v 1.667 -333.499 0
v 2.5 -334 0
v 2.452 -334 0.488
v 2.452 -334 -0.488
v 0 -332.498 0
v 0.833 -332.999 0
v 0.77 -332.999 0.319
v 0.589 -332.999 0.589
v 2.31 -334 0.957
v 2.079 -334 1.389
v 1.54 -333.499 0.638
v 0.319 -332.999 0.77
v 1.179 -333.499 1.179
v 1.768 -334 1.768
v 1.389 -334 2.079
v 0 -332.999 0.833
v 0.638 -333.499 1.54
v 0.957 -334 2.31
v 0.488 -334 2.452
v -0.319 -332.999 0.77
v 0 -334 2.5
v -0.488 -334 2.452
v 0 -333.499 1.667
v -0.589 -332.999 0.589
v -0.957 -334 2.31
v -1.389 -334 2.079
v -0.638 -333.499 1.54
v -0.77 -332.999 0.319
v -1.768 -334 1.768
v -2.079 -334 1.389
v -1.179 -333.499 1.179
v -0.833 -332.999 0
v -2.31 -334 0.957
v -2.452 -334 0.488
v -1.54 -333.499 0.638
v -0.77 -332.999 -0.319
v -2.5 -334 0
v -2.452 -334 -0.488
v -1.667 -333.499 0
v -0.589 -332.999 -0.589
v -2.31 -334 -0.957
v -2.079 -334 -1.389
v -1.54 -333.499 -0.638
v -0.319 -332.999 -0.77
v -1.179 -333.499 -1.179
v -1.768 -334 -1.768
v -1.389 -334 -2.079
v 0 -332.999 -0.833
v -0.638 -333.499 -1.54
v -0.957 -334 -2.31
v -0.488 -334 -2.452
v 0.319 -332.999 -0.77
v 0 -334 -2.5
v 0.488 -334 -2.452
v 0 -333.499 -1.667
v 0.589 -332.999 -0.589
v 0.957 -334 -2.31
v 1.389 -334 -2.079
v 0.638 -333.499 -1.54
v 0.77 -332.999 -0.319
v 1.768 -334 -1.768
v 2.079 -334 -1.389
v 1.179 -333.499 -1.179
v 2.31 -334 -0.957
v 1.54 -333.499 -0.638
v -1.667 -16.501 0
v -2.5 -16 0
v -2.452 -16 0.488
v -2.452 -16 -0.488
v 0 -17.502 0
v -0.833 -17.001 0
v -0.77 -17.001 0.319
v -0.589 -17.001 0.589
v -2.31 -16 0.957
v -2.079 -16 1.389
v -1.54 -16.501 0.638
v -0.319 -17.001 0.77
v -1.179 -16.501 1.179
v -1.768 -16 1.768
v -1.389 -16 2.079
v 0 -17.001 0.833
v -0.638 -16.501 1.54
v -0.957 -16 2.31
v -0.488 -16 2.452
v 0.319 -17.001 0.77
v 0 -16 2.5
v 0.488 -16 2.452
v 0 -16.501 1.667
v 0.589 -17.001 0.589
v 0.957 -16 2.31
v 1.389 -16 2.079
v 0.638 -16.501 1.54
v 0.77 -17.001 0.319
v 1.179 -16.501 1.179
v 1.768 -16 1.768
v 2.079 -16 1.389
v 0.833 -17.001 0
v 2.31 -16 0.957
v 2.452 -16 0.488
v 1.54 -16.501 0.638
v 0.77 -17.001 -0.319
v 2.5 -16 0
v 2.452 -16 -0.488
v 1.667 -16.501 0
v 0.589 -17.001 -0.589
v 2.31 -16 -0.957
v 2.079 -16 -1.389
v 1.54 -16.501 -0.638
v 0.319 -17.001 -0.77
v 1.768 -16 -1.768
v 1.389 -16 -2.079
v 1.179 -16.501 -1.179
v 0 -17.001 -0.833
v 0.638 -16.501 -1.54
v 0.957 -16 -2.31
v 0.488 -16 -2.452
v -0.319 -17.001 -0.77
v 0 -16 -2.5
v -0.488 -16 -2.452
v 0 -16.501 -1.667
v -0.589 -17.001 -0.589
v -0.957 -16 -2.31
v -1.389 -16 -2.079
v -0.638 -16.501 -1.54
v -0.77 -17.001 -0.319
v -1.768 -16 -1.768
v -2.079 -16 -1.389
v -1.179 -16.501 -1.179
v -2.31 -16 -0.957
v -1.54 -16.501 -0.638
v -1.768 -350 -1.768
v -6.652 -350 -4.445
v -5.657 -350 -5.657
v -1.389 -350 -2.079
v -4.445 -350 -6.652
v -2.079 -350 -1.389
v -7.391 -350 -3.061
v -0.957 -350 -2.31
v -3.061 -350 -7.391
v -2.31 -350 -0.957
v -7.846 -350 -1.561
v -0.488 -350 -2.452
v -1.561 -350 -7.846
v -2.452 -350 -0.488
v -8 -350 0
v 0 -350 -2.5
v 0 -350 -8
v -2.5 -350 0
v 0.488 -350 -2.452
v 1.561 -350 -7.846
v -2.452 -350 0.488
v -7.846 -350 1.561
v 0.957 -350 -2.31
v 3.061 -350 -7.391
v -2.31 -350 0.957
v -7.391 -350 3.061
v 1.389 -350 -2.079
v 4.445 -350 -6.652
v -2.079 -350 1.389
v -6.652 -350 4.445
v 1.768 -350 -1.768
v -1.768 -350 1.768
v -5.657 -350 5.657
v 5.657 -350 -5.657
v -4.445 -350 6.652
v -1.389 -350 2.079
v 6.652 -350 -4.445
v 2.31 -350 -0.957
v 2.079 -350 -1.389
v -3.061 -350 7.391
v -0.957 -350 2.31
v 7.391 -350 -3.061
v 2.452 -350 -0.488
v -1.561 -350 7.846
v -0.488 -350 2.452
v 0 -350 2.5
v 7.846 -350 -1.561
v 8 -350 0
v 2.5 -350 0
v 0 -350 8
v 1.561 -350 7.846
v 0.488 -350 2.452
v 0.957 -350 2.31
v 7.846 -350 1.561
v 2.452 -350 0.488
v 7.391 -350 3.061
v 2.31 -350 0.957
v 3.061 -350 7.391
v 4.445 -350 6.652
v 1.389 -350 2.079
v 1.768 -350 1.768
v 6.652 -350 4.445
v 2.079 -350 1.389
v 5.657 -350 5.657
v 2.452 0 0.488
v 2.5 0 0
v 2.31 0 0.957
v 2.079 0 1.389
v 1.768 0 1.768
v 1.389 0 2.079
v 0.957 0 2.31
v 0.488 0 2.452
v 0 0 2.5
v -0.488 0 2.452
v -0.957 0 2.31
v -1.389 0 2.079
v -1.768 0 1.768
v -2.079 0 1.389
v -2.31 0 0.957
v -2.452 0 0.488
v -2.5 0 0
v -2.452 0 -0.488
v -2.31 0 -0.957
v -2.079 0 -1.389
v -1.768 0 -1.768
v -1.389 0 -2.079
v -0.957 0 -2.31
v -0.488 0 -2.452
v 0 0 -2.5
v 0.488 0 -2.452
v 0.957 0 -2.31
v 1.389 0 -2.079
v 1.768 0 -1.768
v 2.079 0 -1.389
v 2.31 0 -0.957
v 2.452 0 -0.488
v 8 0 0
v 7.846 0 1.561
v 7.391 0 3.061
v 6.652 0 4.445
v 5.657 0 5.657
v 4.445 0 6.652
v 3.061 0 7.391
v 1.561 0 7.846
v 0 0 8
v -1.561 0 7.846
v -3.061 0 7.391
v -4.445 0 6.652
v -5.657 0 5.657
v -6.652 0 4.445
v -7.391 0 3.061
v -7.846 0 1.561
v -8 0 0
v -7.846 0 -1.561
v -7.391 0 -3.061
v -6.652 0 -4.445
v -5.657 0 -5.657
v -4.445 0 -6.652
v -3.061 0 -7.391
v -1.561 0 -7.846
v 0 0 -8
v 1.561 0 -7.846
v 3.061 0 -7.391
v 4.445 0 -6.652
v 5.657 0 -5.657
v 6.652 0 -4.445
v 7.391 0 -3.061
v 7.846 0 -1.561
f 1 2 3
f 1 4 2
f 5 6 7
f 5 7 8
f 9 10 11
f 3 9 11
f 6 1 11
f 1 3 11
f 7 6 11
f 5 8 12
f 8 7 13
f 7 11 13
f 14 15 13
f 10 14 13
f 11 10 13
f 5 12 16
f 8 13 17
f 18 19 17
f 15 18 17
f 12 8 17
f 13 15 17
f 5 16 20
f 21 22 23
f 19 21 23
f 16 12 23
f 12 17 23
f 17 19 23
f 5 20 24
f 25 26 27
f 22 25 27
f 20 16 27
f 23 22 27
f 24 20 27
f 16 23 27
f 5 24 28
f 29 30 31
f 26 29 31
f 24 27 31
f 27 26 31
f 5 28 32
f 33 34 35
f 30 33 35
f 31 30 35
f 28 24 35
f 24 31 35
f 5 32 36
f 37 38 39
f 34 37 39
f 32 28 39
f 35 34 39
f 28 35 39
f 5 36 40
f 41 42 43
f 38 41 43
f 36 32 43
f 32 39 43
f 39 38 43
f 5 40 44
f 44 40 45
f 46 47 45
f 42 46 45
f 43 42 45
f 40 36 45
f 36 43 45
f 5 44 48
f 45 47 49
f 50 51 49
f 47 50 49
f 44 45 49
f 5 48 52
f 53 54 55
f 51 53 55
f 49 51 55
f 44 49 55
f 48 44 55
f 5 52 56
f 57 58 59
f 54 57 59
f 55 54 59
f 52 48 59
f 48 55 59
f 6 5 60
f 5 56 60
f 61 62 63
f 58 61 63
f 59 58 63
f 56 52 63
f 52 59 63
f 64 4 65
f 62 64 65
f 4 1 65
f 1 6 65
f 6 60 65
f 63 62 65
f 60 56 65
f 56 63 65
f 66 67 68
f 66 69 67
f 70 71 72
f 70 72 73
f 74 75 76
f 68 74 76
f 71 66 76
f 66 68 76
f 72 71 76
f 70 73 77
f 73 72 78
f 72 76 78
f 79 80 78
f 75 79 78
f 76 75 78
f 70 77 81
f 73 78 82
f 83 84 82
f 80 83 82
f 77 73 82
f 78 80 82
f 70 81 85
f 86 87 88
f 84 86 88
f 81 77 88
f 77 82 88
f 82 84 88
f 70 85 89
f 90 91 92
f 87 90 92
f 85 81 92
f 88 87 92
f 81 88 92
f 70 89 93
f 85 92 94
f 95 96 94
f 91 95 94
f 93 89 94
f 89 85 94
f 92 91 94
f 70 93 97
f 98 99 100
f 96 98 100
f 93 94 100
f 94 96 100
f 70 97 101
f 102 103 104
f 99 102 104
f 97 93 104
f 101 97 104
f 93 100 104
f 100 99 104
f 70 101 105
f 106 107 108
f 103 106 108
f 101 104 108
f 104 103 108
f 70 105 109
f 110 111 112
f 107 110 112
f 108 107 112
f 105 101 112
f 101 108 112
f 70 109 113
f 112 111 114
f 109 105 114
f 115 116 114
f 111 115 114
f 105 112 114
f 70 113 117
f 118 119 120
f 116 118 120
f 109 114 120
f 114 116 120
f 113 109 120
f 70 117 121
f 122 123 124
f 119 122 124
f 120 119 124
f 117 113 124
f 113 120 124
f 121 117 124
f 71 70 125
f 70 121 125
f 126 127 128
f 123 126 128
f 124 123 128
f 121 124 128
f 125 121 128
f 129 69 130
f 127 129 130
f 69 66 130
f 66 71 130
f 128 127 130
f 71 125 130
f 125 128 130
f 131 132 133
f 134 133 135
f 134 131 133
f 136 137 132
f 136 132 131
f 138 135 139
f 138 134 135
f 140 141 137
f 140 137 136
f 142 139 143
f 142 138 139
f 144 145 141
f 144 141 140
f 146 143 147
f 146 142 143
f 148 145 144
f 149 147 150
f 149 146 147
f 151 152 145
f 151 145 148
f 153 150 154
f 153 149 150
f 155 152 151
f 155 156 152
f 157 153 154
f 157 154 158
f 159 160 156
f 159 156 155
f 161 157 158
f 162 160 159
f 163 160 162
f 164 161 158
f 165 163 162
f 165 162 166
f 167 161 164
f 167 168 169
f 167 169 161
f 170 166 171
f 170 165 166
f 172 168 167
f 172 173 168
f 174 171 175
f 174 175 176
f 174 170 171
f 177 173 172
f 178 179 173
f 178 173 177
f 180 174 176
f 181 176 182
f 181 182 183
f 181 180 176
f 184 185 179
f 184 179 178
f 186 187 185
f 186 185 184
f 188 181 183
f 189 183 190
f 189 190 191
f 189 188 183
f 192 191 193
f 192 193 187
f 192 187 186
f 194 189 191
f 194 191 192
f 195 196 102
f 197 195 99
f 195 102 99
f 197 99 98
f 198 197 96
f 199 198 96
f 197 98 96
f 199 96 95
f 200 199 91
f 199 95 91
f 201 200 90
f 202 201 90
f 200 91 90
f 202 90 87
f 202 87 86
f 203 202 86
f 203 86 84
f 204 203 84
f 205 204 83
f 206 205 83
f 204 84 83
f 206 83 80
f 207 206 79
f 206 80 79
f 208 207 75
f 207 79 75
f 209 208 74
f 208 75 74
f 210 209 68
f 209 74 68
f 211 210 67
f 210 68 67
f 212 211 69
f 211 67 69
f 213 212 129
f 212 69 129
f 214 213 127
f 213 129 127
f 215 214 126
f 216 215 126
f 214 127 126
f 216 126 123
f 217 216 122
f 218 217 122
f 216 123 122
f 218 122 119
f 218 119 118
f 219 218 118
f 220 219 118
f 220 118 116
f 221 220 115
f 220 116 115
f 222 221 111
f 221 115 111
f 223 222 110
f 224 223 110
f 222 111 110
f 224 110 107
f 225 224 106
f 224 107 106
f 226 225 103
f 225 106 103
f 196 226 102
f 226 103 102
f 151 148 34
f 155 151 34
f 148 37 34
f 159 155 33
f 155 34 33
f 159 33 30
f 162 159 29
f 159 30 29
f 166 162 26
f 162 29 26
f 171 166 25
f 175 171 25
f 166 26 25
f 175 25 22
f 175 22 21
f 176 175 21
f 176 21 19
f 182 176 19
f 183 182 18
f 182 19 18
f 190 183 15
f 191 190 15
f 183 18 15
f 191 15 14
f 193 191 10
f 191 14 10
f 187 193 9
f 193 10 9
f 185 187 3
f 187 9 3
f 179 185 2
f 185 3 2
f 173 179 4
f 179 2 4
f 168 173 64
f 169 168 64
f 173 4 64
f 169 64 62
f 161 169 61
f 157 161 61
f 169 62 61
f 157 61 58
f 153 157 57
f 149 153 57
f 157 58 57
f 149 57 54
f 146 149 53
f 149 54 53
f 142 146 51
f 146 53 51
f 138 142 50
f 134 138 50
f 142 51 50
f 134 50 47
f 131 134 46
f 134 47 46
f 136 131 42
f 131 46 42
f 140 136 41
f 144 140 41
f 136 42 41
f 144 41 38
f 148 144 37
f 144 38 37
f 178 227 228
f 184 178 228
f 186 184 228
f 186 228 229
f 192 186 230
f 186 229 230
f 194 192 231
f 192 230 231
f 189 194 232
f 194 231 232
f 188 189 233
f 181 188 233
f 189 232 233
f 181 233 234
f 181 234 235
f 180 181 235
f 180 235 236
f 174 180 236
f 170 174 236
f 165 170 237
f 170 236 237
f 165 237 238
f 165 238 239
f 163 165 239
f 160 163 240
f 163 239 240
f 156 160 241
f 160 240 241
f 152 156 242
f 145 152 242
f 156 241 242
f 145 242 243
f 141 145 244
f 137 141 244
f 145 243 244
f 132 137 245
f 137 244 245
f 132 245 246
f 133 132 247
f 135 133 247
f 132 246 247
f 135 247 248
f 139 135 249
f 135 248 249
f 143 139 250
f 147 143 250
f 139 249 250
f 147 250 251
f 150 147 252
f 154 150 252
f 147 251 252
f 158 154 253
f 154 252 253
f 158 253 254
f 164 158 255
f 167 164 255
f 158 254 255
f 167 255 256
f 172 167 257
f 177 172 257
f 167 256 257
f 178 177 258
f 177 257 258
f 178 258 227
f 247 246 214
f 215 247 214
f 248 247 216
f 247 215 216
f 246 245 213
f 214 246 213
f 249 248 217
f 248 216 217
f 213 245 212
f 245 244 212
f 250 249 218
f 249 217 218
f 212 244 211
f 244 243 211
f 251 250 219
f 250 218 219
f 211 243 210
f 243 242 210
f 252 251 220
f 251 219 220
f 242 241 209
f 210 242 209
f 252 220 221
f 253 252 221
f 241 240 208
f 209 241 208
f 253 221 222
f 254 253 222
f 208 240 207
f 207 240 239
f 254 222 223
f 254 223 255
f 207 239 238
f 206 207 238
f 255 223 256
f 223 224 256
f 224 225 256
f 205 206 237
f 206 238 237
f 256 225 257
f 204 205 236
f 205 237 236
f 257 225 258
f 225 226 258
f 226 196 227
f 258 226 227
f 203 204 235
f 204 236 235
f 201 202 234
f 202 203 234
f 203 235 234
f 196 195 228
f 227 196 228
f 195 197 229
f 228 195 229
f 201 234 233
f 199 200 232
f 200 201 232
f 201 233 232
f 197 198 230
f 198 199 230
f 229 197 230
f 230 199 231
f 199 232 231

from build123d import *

# Parameters (mm, degrees)
F0_R     = 8
F1_DEPTH = 350
F4_D     = 5
F4_DEPTH = 16
F4_TIP   = 1.5021515476
F6_D     = 5
F6_DEPTH = 16
F6_TIP   = 1.5021515476


with BuildPart() as f1:
    # F0 (on Front) → F1 (new body)
    with BuildSketch(Plane.XZ):
        Circle(F0_R)
    extrude(amount=F1_DEPTH)

    # F4
    with Locations(Plane(origin=(0, 0, 0), x_dir=(-1, 0, 0), z_dir=(0, 1, 0))):
        with Locations((0, 0)):
            Hole(F4_D / 2, depth=F4_DEPTH)
            with Locations((0, 0, -(F4_DEPTH + F4_TIP / 2))):  # 118° drill point
                Cone(0, F4_D / 2, F4_TIP, mode=Mode.SUBTRACT)

    # F6
    with Locations(Plane.XZ.offset(350)):
        with Locations((0, 0)):
            Hole(F6_D / 2, depth=F6_DEPTH)
            with Locations((0, 0, -(F6_DEPTH + F6_TIP / 2))):  # 118° drill point
                Cone(0, F6_D / 2, F6_TIP, mode=Mode.SUBTRACT)


solid = f1.part
